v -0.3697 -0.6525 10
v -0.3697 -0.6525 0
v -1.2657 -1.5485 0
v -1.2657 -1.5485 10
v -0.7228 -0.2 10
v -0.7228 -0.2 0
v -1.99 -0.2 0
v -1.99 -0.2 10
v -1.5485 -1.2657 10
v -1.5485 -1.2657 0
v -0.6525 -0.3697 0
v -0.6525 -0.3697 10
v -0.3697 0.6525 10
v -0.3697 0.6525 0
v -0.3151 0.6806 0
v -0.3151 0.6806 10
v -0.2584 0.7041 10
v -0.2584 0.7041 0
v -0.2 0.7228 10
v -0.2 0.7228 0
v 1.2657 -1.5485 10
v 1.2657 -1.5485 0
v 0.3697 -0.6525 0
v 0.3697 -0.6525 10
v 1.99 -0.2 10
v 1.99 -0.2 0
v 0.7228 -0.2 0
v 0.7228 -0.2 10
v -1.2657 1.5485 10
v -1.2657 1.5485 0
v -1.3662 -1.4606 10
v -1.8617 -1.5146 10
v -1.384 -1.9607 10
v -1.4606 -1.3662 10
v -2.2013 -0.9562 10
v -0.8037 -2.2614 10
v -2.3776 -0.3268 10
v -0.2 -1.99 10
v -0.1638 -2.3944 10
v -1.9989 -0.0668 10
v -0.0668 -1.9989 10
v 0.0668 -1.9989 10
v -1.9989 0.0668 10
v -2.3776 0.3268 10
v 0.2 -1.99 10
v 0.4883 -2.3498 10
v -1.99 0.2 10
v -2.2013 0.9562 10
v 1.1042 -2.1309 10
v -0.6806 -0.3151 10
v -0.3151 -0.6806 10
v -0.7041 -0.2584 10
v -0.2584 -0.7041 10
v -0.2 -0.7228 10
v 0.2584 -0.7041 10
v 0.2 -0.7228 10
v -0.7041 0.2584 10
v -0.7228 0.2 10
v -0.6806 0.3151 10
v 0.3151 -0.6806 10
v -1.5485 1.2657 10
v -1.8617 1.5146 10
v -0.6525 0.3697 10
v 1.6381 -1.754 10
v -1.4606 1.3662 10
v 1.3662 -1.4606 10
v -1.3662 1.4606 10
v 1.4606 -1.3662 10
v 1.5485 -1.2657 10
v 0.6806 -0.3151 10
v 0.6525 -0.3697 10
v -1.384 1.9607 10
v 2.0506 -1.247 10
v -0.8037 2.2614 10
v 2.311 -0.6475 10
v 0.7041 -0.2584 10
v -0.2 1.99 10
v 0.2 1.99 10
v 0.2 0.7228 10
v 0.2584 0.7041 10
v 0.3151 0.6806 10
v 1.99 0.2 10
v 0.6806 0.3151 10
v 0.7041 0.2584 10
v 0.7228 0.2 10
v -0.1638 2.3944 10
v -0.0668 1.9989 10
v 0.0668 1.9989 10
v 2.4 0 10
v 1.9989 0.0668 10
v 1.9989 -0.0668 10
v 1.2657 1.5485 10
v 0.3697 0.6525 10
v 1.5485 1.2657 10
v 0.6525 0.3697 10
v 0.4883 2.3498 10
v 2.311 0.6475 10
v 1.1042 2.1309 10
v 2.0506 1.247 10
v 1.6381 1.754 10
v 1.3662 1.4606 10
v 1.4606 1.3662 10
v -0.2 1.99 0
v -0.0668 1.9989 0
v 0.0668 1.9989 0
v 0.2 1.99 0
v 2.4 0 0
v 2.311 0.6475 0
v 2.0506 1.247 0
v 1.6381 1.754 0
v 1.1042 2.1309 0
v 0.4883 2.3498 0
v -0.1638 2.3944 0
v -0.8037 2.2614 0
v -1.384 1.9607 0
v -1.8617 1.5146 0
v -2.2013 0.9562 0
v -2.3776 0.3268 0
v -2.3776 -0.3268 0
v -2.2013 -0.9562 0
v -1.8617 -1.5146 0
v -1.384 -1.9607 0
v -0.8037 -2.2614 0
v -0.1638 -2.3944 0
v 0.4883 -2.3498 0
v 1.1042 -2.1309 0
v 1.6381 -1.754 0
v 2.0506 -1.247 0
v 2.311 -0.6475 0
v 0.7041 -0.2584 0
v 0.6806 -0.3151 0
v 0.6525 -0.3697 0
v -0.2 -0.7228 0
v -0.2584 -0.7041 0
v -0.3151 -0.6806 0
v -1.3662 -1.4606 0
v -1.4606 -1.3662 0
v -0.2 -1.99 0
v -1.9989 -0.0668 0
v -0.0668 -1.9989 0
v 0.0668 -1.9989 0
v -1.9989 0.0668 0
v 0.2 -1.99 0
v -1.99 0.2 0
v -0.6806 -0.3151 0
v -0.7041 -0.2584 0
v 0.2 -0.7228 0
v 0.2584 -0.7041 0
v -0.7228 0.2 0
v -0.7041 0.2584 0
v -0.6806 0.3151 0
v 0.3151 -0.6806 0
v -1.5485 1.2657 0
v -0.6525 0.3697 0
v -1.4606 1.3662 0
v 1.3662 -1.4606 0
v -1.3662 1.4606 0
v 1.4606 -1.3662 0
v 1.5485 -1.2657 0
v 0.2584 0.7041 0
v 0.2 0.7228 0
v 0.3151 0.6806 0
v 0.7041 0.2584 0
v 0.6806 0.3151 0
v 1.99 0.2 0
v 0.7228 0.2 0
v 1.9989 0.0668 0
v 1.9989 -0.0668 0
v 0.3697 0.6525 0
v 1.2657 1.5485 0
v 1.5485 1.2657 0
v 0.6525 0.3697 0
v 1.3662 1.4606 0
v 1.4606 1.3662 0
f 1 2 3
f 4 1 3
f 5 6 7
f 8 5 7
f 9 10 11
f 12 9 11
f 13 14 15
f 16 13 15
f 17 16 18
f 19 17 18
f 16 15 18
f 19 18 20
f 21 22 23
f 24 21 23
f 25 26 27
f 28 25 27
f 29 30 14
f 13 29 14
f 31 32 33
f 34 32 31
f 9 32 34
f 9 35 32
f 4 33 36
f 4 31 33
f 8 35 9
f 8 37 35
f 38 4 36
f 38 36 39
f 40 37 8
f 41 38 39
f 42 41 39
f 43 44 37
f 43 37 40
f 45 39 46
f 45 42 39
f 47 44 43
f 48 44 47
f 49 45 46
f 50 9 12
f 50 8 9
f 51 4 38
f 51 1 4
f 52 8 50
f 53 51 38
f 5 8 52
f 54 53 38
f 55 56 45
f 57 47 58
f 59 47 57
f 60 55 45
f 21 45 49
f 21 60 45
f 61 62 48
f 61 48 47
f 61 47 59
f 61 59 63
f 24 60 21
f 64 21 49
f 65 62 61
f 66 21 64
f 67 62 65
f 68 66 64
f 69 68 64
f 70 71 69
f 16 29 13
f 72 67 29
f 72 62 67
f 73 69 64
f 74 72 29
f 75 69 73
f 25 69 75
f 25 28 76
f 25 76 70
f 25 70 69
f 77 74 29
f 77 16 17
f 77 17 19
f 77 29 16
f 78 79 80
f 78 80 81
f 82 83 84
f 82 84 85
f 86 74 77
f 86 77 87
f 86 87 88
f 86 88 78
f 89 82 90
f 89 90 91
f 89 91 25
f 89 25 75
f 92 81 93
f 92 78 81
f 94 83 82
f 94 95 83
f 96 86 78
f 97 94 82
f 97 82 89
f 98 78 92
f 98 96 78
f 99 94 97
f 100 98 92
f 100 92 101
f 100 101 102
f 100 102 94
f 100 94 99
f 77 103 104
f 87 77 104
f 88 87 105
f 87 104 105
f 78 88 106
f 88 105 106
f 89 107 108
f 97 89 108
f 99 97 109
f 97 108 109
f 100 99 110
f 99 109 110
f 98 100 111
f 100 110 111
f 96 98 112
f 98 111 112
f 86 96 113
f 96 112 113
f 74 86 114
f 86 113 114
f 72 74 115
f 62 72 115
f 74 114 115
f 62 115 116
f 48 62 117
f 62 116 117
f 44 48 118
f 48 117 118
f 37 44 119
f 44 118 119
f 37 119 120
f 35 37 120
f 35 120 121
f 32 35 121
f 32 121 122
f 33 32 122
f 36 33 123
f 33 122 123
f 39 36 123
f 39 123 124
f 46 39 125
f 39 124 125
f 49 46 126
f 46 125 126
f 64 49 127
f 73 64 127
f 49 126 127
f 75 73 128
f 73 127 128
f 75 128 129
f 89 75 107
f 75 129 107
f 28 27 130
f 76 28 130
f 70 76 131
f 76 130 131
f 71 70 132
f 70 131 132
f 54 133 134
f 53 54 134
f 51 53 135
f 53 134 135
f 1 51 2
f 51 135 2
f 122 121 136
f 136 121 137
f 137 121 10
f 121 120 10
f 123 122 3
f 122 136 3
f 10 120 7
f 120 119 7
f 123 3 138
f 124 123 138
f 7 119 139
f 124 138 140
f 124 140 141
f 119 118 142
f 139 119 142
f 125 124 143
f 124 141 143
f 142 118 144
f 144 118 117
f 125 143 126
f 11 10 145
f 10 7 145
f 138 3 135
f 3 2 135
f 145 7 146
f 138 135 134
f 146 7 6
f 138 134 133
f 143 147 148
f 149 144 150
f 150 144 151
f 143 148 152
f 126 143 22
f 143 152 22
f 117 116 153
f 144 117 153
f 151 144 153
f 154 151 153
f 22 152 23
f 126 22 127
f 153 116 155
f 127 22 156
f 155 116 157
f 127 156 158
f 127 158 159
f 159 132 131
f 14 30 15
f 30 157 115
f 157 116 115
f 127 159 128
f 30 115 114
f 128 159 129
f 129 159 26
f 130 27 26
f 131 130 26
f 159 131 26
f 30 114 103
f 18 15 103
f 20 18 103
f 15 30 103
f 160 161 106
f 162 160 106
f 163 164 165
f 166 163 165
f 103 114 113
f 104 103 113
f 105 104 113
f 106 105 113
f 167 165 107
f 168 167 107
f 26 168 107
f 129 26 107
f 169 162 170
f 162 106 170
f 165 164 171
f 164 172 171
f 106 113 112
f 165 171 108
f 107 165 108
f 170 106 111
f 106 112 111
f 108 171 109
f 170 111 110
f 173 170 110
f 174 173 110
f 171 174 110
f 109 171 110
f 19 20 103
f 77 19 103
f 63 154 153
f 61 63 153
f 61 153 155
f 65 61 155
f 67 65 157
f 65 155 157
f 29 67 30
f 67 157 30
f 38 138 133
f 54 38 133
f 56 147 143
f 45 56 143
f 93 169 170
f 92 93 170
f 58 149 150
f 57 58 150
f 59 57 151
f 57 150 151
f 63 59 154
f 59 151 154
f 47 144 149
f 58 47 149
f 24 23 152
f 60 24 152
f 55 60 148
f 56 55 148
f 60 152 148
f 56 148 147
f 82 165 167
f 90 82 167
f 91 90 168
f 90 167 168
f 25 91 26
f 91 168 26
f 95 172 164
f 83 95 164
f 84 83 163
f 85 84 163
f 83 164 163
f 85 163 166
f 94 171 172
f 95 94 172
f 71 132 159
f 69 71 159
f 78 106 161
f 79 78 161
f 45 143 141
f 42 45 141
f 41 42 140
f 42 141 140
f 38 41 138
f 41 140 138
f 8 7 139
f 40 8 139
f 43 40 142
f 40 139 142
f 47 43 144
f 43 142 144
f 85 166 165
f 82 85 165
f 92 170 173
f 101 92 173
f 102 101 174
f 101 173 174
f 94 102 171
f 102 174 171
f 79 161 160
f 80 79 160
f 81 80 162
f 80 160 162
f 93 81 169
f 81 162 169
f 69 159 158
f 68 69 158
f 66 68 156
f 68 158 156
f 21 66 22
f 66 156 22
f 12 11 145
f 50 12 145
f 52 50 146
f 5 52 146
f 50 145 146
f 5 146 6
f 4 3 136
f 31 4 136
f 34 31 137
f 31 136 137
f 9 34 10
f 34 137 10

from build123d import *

# Parameters (mm, degrees)
F0_R     = 2.4
F1_DEPTH = 10


with BuildPart() as f1:
    # F0 (on Top) → F1 (new body)
    with BuildSketch(Plane.XY):
        Circle(F0_R)
        with BuildLine():
            ThreePointArc((-1.548546, 1.265703), (-1.414214, 1.414214), (-1.265703, 1.548546))
            Line((-1.265703, 1.548546), (-0.369705, 0.652548))
            ThreePointArc((-0.369705, 0.652548), (-0.287013, 0.69291), (-0.2, 0.722842))
            Line((-0.2, 0.722842), (-0.2, 1.989975))
            ThreePointArc((-0.2, 1.989975), (0, 2), (0.2, 1.989975))
            Line((0.2, 1.989975), (0.2, 0.722842))
            ThreePointArc((0.2, 0.722842), (0.287013, 0.69291), (0.369705, 0.652548))
            Line((0.369705, 0.652548), (1.265703, 1.548546))
            ThreePointArc((1.265703, 1.548546), (1.414214, 1.414214), (1.548546, 1.265703))
            Line((1.548546, 1.265703), (0.652548, 0.369705))
            ThreePointArc((0.652548, 0.369705), (0.69291, 0.287013), (0.722842, 0.2))
            Line((0.722842, 0.2), (1.989975, 0.2))
            ThreePointArc((1.989975, 0.2), (2, 0), (1.989975, -0.2))
            Line((1.989975, -0.2), (0.722842, -0.2))
            ThreePointArc((0.722842, -0.2), (0.69291, -0.287013), (0.652548, -0.369705))
            Line((0.652548, -0.369705), (1.548546, -1.265703))
            ThreePointArc((1.548546, -1.265703), (1.414214, -1.414214), (1.265703, -1.548546))
            Line((1.265703, -1.548546), (0.369705, -0.652548))
            ThreePointArc((0.369705, -0.652548), (0.287013, -0.69291), (0.2, -0.722842))
            Line((0.2, -0.722842), (0.2, -1.989975))
            ThreePointArc((0.2, -1.989975), (0, -2), (-0.2, -1.989975))
            Line((-0.2, -1.989975), (-0.2, -0.722842))
            ThreePointArc((-0.2, -0.722842), (-0.287013, -0.69291), (-0.369705, -0.652548))
            Line((-0.369705, -0.652548), (-1.265703, -1.548546))
            ThreePointArc((-1.265703, -1.548546), (-1.414214, -1.414214), (-1.548546, -1.265703))
            Line((-1.548546, -1.265703), (-0.652548, -0.369705))
            ThreePointArc((-0.652548, -0.369705), (-0.69291, -0.287013), (-0.722842, -0.2))
            Line((-0.722842, -0.2), (-1.989975, -0.2))
            ThreePointArc((-1.989975, -0.2), (-2, 0), (-1.989975, 0.2))
            Line((-1.989975, 0.2), (-0.722842, 0.2))
            ThreePointArc((-0.722842, 0.2), (-0.69291, 0.287013), (-0.652548, 0.369705))
            Line((-0.652548, 0.369705), (-1.548546, 1.265703))
        make_face(mode=Mode.SUBTRACT)
    extrude(amount=F1_DEPTH)


solid = f1.part
